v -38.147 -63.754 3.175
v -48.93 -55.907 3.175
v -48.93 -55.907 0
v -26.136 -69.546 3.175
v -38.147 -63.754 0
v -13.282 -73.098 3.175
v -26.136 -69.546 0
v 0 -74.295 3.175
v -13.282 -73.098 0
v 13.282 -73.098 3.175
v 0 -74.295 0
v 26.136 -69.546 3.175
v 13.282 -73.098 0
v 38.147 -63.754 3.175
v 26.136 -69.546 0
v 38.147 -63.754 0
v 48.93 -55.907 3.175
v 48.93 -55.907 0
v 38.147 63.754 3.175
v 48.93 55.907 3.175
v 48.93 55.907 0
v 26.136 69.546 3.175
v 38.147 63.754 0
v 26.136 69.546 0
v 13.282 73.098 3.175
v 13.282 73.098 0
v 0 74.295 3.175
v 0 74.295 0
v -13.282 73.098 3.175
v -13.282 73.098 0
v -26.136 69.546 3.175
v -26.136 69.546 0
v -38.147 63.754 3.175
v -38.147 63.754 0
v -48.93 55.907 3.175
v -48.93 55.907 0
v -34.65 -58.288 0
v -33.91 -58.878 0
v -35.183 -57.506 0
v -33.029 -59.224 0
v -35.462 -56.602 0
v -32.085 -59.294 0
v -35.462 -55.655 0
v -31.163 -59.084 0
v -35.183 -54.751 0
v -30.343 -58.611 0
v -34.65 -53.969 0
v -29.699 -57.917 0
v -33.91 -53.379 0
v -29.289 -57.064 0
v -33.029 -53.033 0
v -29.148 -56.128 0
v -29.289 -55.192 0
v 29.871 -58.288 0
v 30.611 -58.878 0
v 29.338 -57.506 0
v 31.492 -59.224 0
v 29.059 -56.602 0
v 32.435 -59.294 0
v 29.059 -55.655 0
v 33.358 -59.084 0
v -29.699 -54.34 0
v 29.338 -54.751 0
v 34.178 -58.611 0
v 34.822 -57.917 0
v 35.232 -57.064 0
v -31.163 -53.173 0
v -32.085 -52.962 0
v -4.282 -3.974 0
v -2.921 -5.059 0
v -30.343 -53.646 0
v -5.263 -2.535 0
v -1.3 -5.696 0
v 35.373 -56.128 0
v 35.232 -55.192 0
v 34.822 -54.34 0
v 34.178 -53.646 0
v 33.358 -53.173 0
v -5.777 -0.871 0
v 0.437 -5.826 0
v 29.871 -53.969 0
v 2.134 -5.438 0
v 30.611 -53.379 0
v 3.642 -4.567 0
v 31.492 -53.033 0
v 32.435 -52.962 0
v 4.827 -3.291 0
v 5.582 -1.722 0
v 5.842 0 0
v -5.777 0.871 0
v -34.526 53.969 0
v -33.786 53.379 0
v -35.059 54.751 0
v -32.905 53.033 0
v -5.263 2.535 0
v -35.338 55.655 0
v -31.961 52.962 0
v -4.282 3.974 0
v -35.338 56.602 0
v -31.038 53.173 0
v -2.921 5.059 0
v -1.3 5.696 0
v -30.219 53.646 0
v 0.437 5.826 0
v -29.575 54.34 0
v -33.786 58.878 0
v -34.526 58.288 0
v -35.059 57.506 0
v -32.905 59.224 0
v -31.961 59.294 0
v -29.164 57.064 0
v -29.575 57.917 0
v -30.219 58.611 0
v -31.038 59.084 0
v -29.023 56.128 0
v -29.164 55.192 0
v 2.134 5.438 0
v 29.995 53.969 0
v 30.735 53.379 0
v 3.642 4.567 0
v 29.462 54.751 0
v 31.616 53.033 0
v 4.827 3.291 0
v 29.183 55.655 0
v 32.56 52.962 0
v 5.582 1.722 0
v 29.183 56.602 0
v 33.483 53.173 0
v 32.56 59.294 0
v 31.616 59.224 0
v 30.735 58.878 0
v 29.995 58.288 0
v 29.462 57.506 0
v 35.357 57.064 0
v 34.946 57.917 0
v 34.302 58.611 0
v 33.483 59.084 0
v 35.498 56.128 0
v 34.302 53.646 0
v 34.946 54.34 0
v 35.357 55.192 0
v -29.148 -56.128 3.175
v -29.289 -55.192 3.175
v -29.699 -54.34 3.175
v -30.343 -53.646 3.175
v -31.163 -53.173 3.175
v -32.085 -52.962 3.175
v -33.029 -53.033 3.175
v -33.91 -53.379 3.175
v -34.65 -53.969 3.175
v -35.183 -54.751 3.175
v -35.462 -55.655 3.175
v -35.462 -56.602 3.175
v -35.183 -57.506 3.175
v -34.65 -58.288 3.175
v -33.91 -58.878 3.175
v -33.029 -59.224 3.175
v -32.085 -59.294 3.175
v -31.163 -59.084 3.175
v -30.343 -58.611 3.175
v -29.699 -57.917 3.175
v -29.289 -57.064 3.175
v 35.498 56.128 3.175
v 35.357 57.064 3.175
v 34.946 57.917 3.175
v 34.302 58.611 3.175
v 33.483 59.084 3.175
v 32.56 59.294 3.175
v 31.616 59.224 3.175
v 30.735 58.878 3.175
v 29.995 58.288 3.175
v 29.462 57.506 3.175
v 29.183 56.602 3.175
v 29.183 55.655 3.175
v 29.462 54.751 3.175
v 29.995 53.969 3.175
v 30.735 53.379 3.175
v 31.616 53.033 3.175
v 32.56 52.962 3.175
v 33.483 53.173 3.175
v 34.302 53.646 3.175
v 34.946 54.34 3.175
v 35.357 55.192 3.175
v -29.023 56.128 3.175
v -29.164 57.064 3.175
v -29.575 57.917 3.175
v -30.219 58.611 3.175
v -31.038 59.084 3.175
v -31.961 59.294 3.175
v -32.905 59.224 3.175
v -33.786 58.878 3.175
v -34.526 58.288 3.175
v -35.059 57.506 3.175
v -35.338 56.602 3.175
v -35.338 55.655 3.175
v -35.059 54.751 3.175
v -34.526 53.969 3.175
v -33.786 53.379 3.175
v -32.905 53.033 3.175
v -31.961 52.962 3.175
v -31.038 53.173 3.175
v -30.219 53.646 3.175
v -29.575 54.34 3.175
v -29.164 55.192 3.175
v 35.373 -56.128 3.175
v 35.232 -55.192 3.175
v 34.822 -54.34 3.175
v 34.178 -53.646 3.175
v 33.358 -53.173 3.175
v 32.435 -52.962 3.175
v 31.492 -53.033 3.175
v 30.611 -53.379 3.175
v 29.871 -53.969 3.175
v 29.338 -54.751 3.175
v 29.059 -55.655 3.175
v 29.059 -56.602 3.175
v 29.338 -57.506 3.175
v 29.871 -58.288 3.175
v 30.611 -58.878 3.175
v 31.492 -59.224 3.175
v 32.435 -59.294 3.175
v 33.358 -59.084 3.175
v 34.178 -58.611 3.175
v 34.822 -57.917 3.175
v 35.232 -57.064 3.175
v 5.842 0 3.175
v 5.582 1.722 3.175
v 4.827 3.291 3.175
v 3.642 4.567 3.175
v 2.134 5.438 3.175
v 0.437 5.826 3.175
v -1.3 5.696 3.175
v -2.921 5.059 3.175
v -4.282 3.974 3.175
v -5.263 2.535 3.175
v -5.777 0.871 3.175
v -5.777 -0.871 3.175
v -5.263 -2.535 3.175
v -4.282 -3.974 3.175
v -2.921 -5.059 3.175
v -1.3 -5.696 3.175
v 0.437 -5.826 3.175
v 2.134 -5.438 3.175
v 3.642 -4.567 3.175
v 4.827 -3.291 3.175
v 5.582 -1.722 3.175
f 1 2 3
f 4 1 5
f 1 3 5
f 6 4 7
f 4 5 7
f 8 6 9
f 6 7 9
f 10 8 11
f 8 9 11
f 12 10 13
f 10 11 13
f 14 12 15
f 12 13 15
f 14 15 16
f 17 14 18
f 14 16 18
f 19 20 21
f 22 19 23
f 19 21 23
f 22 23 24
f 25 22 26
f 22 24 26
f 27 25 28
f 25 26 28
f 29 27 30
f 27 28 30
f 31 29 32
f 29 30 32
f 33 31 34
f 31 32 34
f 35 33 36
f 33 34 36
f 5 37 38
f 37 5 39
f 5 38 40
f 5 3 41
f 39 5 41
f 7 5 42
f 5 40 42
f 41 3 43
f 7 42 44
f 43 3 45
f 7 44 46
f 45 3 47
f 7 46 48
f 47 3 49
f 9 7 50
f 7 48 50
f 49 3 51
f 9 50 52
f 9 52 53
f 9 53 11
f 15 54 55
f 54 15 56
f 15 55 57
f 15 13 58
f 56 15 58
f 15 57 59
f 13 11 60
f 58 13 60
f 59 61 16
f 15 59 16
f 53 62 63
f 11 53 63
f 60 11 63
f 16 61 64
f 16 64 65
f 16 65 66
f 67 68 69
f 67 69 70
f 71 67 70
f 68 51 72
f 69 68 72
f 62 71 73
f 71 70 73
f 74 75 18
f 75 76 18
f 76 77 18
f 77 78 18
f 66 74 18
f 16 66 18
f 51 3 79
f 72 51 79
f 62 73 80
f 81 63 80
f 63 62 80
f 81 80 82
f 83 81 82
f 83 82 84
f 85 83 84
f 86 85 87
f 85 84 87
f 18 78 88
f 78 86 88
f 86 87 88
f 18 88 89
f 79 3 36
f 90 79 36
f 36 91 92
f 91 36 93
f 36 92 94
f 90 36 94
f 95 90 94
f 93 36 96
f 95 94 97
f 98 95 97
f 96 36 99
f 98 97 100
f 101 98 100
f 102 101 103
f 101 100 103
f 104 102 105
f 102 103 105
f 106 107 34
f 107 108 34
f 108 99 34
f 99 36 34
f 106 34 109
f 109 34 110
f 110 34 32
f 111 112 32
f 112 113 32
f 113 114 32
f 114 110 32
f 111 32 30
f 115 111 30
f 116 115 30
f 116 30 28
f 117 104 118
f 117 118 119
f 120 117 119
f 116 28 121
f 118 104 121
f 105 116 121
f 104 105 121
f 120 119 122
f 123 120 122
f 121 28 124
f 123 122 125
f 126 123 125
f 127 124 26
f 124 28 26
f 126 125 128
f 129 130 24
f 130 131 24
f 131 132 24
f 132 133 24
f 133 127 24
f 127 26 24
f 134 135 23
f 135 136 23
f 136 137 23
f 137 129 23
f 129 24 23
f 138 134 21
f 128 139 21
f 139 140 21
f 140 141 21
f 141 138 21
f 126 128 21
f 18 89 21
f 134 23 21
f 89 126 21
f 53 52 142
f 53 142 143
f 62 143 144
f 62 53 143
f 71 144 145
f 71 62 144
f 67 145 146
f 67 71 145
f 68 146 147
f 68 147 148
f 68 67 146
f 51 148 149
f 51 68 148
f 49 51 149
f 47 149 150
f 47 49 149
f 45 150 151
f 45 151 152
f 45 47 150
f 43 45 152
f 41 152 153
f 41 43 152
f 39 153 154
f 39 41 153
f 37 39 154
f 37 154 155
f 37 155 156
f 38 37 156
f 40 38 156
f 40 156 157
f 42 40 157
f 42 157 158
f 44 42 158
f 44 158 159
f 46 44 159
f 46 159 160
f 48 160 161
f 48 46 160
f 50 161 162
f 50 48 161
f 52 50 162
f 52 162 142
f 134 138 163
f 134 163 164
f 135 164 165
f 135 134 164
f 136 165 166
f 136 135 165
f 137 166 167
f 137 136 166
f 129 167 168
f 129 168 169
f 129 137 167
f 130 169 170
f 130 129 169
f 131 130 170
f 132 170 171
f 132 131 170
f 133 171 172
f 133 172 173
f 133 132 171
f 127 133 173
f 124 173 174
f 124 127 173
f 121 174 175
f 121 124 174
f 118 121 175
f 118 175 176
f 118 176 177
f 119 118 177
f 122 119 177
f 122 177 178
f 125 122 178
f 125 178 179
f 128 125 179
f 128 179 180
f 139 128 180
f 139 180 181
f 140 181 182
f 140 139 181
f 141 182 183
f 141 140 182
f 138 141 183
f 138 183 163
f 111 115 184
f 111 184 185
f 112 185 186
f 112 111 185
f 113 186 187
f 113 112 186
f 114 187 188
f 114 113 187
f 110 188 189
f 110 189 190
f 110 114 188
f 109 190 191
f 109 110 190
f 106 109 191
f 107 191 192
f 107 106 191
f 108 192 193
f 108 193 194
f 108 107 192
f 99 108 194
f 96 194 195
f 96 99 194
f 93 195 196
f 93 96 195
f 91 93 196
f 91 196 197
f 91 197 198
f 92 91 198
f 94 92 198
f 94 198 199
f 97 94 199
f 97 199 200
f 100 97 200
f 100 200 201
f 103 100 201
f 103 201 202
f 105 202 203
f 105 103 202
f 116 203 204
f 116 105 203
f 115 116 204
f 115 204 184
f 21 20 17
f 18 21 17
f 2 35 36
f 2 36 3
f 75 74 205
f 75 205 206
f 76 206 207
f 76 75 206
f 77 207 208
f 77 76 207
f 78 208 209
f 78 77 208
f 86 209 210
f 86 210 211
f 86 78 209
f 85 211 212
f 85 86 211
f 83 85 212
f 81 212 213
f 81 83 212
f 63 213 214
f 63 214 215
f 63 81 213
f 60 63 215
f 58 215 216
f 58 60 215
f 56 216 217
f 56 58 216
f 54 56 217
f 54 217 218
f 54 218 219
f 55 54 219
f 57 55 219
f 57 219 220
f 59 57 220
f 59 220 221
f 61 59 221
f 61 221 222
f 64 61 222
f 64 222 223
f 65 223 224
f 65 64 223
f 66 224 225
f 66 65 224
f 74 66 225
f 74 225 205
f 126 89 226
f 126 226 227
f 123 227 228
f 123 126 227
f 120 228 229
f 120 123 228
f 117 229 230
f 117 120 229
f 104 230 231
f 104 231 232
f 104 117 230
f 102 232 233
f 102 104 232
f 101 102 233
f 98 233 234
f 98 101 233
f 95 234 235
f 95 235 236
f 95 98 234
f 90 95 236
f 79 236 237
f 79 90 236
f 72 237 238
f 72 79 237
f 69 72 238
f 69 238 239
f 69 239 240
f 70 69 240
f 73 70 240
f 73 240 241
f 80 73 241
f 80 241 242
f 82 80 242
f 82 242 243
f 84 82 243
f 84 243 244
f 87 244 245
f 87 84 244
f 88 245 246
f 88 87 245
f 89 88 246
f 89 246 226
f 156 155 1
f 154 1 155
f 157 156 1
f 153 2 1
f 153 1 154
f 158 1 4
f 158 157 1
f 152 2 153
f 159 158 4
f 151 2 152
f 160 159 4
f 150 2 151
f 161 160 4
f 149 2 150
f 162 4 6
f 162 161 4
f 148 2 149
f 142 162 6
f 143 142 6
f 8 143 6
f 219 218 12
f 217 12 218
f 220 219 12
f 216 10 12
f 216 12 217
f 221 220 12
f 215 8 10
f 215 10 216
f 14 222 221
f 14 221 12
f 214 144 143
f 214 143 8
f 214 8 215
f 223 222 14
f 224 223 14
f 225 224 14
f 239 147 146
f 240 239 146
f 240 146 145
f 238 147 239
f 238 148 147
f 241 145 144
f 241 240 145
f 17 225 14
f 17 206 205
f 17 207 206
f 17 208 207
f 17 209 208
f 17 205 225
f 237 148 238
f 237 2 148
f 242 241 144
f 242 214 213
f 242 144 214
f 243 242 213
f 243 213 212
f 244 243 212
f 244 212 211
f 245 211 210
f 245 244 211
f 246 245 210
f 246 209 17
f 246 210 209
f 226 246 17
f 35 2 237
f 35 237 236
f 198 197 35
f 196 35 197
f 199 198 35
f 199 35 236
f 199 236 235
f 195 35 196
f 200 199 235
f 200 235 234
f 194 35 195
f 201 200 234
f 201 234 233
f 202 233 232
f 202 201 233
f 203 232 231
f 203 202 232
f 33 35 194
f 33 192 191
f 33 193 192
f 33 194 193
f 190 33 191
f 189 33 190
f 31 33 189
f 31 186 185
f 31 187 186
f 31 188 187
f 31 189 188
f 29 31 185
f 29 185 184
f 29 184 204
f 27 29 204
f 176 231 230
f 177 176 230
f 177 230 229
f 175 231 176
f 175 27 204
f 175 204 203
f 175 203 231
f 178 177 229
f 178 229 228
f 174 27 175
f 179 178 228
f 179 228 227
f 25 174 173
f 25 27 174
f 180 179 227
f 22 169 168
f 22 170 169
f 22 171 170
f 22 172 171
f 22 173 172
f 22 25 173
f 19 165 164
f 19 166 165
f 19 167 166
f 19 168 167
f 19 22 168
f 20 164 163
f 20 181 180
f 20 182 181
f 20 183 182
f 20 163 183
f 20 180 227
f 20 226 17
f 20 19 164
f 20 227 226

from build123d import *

# Parameters (mm, degrees)
SKETCH3_R           = 74.295
SKETCH3_R_2         = 3.175
SKETCH3_R_3         = 5.842
BOSS_EXTRUDE2_DEPTH = 3.175
CUT_EXTRUDE2_DEPTH  = 4.175


with BuildPart() as part:
    # Sketch3 → Boss-Extrude2 (new body)
    with BuildSketch(Plane.XY):
        Circle(SKETCH3_R)
        with Locations((-32.198217622, 56.128319663)):
            Circle(SKETCH3_R_2, mode=Mode.SUBTRACT)
        with Locations((32.322739207, 56.128319663)):
            Circle(SKETCH3_R_2, mode=Mode.SUBTRACT)
        with Locations((-32.322739207, -56.128319663)):
            Circle(SKETCH3_R_2, mode=Mode.SUBTRACT)
        with Locations((32.198217622, -56.128319663)):
            Circle(SKETCH3_R_2, mode=Mode.SUBTRACT)
        Circle(SKETCH3_R_3, mode=Mode.SUBTRACT)
    extrude(amount=BOSS_EXTRUDE2_DEPTH)

    # Sketch4 → Cut-Extrude2 (cut, through all)
    with BuildSketch(Plane.XY.offset(3.175)):
        with BuildLine():
            Line((-48.930202294, 55.906907699), (-48.930202294, -55.906907699))
            ThreePointArc((-48.930202294, -55.906907699), (-74.295, 0), (-48.930202294, 55.906907699))
        make_face()
        with BuildLine():
            Line((48.930202294, 55.906907699), (48.930202294, -55.906907699))
            ThreePointArc((48.930202294, -55.906907699), (74.295, 0), (48.930202294, 55.906907699))
        make_face()
    extrude(amount=-CUT_EXTRUDE2_DEPTH, mode=Mode.SUBTRACT)


solid = part.part
